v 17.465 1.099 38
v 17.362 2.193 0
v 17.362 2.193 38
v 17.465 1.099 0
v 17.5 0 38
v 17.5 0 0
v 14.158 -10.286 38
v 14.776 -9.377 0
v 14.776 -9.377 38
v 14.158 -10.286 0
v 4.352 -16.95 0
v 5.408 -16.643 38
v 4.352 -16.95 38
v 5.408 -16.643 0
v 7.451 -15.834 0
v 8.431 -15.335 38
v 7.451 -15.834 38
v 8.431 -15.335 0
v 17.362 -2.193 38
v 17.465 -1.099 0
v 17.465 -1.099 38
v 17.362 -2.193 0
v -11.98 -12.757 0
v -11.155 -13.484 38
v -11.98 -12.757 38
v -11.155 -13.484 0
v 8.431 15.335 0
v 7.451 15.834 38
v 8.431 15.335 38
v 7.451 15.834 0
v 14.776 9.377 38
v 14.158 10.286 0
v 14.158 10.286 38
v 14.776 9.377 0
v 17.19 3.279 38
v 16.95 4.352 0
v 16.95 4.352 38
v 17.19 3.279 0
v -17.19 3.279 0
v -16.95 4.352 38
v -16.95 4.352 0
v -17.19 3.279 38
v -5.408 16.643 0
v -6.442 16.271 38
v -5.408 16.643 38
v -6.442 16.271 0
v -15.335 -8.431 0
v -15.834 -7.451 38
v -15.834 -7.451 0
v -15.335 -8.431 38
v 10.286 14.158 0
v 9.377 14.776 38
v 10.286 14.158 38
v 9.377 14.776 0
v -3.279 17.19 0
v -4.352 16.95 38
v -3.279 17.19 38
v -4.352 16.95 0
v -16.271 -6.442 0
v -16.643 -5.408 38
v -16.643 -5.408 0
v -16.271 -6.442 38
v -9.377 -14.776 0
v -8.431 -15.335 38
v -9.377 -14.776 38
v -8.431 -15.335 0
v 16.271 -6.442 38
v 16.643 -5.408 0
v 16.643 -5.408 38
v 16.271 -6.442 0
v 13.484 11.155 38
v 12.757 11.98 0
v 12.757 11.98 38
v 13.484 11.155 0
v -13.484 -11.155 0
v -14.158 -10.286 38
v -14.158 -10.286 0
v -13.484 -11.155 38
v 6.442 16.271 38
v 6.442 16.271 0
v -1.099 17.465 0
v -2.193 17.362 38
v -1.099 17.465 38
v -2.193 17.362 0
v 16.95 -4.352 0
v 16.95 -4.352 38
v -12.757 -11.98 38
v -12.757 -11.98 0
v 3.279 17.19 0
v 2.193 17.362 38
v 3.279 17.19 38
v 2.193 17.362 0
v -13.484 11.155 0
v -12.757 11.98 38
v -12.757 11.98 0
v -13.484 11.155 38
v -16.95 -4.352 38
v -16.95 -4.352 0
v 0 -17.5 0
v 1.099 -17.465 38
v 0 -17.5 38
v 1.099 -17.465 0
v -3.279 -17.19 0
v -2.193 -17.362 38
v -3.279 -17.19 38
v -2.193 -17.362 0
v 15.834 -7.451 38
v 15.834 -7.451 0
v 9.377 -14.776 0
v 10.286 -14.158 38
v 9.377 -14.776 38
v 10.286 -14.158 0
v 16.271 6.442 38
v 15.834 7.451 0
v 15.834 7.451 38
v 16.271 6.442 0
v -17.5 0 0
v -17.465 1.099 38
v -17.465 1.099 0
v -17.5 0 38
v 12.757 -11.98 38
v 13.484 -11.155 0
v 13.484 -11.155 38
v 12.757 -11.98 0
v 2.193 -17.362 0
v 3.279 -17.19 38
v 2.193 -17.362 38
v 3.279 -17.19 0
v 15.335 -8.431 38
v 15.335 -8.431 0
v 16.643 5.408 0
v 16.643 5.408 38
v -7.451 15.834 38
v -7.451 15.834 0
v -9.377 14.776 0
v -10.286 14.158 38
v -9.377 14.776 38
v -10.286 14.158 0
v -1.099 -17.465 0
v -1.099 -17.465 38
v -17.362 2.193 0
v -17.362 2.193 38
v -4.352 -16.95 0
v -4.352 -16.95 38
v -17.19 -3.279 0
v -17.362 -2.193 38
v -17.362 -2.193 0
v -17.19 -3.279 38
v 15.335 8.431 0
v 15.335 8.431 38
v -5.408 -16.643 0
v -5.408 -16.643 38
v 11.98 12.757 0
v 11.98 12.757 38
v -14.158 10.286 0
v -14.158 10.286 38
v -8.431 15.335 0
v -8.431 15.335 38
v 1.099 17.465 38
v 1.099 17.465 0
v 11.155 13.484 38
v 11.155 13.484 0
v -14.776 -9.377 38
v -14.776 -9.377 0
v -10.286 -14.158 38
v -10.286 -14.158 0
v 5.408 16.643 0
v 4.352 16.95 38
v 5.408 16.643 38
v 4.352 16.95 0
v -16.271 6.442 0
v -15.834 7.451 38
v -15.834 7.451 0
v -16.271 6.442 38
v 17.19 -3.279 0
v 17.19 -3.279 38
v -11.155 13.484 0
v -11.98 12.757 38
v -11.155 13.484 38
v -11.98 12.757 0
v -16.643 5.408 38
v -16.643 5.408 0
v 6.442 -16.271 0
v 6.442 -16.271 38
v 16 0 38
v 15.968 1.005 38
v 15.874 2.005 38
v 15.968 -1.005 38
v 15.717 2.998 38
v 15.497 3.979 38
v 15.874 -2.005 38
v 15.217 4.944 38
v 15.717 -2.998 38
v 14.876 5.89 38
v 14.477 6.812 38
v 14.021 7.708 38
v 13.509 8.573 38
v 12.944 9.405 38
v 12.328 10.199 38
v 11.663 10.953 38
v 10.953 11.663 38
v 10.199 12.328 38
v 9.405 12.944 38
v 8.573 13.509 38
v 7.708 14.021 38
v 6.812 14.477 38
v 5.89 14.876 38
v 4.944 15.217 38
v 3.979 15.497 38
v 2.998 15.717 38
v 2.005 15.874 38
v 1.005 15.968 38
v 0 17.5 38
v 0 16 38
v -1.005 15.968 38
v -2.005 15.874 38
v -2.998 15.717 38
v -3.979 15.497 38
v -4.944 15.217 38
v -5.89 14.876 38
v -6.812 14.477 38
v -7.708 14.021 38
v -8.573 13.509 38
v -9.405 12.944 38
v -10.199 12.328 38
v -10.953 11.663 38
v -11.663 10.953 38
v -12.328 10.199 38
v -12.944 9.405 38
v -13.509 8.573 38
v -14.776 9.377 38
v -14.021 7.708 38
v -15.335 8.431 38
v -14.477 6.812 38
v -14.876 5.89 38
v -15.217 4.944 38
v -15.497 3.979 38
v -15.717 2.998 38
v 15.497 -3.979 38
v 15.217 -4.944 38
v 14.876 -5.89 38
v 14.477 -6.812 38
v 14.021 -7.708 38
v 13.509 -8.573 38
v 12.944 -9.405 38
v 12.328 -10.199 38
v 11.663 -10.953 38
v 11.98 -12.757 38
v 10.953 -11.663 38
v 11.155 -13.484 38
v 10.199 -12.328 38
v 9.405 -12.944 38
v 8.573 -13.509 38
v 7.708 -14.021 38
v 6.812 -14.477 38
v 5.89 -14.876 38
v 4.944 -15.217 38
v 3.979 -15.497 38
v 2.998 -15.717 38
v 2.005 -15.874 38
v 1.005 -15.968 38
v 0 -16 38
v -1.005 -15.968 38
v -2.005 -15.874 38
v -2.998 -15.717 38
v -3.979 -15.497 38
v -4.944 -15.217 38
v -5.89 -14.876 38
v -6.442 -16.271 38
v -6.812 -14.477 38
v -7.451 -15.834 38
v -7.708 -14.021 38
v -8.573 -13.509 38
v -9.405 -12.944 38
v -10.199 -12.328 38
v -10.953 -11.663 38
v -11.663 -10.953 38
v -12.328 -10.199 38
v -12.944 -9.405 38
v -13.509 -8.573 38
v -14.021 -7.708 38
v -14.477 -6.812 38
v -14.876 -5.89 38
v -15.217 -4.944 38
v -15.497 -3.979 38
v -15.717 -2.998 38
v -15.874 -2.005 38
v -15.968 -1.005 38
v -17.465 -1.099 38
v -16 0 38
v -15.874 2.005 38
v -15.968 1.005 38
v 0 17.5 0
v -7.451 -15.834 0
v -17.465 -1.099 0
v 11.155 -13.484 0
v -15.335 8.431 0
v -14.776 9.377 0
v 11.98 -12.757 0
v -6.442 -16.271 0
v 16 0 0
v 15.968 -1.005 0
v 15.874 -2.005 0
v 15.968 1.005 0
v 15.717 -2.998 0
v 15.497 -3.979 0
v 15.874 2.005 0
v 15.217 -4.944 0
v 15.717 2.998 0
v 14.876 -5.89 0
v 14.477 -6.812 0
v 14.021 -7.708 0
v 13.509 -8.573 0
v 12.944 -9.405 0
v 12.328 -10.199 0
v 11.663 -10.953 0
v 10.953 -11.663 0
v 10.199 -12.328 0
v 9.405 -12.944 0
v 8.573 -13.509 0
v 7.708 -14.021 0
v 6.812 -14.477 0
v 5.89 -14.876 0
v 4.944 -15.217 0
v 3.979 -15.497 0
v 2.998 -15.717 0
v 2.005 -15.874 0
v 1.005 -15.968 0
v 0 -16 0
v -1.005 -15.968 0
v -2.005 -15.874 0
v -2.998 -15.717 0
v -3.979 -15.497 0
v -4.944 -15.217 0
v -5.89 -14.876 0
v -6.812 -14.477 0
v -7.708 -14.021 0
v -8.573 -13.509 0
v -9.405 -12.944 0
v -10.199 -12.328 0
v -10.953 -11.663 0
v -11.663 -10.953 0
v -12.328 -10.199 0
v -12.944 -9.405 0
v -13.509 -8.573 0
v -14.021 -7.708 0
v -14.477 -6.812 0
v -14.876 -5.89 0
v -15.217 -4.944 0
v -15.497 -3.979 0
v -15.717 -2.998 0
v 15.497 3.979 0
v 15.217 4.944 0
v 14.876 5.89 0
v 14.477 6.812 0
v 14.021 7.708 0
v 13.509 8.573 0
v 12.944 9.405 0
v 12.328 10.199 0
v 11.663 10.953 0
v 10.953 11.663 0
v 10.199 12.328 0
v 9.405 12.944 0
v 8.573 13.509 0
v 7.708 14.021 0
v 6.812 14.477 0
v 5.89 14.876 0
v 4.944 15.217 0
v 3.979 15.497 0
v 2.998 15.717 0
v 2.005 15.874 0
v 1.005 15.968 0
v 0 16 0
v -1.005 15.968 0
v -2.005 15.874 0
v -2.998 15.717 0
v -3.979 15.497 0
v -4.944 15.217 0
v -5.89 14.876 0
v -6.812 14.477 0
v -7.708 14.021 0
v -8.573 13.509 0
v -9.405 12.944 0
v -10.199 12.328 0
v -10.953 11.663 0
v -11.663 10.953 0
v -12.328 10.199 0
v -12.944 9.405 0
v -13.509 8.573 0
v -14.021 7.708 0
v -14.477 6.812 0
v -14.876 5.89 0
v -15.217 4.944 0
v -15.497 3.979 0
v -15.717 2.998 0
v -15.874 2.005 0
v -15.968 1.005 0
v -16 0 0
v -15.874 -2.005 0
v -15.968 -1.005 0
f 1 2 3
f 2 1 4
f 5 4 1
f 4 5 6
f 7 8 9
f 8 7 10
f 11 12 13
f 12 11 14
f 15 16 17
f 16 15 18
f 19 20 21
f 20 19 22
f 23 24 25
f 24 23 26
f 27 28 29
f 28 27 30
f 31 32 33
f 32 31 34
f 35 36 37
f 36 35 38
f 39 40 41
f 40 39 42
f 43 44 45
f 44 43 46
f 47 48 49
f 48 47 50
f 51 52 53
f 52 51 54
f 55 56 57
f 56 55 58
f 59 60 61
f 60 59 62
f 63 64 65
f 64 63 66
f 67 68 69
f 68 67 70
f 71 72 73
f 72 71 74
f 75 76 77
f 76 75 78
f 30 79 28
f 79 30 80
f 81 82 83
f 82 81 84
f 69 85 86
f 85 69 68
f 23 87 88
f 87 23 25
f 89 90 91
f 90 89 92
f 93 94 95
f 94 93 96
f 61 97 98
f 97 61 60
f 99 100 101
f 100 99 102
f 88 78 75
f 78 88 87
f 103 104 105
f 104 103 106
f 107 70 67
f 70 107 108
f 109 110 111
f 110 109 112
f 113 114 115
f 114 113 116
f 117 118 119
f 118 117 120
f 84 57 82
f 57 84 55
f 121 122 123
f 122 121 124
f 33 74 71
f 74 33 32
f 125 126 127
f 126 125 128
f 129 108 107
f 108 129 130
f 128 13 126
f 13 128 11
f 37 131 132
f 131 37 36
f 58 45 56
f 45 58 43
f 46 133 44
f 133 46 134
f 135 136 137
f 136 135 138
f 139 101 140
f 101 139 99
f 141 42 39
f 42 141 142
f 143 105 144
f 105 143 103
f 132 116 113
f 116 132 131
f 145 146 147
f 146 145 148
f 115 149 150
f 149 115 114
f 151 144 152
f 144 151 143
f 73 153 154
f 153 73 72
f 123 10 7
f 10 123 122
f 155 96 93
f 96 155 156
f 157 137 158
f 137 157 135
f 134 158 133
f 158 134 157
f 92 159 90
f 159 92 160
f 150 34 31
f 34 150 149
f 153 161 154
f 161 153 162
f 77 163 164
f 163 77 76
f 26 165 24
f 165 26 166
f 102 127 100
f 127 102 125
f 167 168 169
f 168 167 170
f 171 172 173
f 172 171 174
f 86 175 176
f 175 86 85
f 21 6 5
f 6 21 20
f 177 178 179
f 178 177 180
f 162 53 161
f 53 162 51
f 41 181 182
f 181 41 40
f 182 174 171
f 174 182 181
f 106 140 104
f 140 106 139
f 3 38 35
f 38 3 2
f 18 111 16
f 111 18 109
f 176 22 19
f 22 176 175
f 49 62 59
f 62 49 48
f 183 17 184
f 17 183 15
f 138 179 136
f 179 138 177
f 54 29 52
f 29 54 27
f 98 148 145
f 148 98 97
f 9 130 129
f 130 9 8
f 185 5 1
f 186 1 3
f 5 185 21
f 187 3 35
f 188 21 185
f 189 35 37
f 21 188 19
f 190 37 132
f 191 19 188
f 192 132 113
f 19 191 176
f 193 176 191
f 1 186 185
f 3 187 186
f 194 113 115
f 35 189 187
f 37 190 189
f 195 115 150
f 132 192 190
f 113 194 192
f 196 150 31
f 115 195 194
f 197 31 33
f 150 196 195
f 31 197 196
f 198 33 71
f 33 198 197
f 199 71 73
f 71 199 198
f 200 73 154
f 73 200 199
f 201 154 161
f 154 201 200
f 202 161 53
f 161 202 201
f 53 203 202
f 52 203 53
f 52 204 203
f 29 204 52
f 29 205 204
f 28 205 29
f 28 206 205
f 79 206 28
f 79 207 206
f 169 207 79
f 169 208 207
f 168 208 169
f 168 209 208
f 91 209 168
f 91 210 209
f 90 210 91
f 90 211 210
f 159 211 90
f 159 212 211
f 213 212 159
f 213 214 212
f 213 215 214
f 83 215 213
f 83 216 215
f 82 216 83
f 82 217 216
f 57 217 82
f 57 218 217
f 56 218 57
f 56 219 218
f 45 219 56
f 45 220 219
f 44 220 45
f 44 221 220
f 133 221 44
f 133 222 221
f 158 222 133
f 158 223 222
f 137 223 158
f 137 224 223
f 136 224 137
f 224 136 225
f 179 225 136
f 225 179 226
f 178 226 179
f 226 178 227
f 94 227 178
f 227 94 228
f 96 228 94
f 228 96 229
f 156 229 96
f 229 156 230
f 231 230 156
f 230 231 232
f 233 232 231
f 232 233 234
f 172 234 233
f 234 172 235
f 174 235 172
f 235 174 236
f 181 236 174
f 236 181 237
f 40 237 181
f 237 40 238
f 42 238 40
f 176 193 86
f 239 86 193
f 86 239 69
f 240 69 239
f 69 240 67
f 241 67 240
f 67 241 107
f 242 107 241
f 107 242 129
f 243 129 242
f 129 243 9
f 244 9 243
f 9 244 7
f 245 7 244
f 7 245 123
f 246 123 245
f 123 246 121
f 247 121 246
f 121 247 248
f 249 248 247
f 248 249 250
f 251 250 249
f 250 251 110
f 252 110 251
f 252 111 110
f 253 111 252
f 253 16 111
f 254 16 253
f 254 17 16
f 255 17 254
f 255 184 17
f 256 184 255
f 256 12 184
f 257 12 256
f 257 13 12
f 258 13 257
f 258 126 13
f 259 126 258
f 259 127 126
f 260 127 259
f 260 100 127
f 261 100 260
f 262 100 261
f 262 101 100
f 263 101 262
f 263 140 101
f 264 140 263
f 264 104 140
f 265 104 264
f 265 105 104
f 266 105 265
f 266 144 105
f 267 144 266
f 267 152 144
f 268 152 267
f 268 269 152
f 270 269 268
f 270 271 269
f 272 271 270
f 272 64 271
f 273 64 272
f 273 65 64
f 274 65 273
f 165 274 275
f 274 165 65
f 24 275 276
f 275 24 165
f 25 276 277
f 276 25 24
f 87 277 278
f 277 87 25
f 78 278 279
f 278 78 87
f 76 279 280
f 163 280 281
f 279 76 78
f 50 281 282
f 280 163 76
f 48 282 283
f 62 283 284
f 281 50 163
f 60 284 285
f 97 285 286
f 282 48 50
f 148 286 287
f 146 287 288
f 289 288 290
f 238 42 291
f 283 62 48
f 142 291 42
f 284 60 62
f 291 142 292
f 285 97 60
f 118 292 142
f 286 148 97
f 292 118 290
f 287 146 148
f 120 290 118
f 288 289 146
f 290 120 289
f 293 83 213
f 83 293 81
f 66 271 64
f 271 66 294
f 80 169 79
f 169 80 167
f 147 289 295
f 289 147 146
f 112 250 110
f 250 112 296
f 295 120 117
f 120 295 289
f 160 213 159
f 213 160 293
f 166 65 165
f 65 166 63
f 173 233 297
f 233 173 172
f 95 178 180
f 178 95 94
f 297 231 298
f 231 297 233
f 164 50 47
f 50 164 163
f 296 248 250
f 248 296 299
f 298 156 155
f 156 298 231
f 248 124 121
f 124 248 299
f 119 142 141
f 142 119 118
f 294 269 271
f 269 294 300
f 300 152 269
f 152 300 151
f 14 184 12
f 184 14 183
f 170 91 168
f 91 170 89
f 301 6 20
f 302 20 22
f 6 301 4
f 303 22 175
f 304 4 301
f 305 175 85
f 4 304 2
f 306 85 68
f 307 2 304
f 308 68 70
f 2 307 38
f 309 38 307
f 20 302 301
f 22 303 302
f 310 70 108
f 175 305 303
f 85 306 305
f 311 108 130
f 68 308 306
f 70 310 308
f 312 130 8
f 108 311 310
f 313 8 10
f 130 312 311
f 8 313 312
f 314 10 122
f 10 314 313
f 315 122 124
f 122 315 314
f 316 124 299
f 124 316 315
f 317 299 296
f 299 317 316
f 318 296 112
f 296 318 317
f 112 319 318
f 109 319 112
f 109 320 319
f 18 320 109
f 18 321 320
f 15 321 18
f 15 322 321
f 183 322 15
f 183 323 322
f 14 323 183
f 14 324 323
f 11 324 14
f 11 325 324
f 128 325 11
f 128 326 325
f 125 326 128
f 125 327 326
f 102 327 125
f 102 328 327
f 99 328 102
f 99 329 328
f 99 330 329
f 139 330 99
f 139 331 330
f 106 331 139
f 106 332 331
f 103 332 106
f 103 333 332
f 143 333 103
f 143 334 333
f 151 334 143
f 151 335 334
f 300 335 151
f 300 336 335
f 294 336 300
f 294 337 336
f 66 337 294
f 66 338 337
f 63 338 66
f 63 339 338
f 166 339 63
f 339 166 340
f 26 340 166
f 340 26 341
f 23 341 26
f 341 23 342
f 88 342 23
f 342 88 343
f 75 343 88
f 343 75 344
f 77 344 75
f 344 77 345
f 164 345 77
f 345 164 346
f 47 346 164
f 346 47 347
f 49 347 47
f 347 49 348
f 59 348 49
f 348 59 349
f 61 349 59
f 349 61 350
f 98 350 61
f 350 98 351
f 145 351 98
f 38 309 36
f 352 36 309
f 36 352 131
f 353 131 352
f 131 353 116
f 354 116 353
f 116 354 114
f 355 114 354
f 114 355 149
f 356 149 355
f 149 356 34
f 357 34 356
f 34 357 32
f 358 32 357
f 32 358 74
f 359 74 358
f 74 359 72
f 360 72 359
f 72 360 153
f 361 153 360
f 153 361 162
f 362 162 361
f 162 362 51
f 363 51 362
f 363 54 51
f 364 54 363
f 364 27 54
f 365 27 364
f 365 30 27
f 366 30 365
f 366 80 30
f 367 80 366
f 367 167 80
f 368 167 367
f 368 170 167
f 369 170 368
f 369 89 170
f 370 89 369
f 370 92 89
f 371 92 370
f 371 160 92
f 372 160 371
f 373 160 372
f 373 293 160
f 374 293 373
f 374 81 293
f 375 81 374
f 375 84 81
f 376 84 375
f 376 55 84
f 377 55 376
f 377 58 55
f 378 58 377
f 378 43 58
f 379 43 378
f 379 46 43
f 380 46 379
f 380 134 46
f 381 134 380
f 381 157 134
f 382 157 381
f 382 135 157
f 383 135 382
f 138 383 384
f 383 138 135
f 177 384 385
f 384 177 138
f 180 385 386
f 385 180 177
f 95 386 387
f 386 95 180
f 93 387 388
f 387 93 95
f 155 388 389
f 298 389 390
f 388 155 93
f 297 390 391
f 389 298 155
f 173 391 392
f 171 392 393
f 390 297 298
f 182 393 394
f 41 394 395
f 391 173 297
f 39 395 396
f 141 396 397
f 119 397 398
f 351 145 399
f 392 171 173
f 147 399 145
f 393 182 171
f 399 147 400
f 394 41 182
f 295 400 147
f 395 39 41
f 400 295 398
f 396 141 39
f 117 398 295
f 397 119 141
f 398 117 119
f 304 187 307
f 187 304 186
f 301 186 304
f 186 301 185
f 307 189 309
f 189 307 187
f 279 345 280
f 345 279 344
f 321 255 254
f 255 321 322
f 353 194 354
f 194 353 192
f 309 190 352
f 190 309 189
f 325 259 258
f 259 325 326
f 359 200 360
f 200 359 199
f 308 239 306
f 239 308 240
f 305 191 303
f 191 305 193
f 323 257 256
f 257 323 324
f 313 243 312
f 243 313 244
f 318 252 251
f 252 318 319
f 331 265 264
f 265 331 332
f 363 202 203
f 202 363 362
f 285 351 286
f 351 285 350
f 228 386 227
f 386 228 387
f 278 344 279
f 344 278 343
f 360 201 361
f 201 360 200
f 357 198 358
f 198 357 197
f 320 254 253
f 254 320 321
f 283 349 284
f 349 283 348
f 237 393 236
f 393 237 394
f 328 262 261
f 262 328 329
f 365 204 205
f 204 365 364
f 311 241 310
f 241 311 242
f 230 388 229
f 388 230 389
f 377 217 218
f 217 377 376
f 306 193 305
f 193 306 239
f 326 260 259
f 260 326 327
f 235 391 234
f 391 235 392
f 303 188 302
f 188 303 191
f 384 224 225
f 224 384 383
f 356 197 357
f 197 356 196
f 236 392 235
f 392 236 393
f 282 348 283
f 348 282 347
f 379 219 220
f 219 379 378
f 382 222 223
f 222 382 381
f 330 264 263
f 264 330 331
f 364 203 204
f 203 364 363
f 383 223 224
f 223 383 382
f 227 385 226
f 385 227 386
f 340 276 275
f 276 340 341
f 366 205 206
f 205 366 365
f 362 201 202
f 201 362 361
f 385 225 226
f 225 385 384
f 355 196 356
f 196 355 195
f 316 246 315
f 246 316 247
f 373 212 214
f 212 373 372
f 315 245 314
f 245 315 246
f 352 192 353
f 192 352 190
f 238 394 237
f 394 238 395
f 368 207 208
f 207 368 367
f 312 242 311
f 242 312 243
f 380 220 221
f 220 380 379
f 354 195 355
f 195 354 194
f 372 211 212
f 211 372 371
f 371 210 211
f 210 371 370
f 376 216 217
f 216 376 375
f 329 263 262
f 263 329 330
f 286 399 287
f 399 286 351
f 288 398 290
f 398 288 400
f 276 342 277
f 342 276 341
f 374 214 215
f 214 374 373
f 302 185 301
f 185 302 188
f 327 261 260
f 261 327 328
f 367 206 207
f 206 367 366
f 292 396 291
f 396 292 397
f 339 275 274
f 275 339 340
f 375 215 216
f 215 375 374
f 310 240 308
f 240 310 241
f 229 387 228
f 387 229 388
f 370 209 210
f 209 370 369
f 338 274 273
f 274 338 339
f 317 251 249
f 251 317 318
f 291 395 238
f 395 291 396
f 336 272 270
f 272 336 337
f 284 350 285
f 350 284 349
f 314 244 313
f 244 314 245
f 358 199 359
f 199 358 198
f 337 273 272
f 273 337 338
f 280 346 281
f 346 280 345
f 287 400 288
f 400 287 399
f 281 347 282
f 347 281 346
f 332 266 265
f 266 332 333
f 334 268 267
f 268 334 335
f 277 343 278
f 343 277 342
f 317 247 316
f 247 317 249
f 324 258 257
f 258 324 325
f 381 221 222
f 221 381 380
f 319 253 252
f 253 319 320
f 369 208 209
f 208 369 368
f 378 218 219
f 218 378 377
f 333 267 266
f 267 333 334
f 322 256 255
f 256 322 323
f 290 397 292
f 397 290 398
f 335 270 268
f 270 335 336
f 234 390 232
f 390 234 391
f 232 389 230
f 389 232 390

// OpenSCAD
//bearing for the lathe

$fn=100;

id = 32;
od = 35;
t = 38;

difference(){
   cylinder(h = t, d = od);
   cylinder(h=t, d=id);
}
